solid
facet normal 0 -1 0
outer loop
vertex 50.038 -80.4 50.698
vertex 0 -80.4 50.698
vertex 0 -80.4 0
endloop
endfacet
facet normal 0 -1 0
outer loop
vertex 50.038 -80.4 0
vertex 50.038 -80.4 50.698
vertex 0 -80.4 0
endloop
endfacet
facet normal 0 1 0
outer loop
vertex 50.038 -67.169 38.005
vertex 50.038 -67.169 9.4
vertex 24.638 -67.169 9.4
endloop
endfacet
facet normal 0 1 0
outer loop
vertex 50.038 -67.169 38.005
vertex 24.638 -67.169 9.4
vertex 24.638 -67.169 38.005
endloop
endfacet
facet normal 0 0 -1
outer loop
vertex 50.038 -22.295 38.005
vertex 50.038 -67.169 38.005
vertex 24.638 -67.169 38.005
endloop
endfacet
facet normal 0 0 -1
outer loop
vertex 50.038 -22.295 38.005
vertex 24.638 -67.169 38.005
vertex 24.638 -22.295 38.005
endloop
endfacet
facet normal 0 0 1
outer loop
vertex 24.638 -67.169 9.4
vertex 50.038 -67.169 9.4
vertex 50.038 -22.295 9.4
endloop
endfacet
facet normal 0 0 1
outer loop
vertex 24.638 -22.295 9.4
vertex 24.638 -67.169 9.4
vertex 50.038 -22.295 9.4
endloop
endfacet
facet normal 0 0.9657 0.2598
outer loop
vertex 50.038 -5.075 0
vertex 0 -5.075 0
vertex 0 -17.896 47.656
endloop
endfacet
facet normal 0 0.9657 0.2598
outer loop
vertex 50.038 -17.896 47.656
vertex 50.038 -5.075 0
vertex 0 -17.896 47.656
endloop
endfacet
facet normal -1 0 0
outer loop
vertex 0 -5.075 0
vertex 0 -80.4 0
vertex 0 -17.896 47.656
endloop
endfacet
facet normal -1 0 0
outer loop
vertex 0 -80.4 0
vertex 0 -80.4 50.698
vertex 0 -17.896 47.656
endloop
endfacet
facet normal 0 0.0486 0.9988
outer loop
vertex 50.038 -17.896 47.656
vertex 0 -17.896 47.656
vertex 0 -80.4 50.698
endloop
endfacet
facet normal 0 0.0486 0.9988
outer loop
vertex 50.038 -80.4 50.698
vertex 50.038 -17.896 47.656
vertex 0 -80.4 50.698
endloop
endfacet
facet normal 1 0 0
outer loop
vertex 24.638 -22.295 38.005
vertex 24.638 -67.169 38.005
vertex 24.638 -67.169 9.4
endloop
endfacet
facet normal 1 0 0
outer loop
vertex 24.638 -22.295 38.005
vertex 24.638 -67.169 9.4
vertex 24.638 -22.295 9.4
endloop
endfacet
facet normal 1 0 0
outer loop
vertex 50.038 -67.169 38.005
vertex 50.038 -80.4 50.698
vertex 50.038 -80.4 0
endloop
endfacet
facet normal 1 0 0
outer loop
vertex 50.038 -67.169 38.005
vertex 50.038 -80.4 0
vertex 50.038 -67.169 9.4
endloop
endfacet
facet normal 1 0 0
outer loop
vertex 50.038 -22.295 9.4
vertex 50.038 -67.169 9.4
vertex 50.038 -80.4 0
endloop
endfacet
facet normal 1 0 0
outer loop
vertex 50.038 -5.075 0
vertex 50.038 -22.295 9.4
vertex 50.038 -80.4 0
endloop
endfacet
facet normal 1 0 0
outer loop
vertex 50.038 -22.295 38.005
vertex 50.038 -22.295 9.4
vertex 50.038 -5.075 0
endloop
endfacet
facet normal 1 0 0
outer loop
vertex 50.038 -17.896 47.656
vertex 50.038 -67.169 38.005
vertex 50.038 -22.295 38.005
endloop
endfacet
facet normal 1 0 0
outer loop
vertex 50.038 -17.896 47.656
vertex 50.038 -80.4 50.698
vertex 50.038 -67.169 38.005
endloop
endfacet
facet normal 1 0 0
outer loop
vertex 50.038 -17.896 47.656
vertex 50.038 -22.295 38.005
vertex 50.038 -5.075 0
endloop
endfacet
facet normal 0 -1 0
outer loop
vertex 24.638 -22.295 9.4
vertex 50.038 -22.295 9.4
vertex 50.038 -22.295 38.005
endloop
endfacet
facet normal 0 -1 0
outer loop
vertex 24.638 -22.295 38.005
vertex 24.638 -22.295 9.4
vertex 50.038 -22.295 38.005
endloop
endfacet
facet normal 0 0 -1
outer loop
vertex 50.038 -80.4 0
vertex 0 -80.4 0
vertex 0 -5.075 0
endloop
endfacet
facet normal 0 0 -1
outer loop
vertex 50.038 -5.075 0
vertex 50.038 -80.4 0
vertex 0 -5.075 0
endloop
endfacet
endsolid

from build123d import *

# Parameters (mm, degrees)
F1_DEPTH = 50.038
F3_W     = 44.874294
F3_H     = 28.605775
F4_DEPTH = 25.4


with BuildPart() as f1:
    # F0 (on Right) → F1 (new body)
    with BuildSketch(Plane.YZ):
        Polygon((-80.399789, 0), (-5.07506, 0), (-17.896298, 47.656219), (-80.399789, 50.697614), align=None)
    extrude(amount=F1_DEPTH)

    # F3 (on face) → F4 (cut)
    with BuildSketch(Plane.YZ.offset(50.038)):
        with Locations((-44.732259, 23.702547)):
            Rectangle(F3_W, F3_H)
    extrude(amount=-F4_DEPTH, mode=Mode.SUBTRACT)


solid = f1.part
